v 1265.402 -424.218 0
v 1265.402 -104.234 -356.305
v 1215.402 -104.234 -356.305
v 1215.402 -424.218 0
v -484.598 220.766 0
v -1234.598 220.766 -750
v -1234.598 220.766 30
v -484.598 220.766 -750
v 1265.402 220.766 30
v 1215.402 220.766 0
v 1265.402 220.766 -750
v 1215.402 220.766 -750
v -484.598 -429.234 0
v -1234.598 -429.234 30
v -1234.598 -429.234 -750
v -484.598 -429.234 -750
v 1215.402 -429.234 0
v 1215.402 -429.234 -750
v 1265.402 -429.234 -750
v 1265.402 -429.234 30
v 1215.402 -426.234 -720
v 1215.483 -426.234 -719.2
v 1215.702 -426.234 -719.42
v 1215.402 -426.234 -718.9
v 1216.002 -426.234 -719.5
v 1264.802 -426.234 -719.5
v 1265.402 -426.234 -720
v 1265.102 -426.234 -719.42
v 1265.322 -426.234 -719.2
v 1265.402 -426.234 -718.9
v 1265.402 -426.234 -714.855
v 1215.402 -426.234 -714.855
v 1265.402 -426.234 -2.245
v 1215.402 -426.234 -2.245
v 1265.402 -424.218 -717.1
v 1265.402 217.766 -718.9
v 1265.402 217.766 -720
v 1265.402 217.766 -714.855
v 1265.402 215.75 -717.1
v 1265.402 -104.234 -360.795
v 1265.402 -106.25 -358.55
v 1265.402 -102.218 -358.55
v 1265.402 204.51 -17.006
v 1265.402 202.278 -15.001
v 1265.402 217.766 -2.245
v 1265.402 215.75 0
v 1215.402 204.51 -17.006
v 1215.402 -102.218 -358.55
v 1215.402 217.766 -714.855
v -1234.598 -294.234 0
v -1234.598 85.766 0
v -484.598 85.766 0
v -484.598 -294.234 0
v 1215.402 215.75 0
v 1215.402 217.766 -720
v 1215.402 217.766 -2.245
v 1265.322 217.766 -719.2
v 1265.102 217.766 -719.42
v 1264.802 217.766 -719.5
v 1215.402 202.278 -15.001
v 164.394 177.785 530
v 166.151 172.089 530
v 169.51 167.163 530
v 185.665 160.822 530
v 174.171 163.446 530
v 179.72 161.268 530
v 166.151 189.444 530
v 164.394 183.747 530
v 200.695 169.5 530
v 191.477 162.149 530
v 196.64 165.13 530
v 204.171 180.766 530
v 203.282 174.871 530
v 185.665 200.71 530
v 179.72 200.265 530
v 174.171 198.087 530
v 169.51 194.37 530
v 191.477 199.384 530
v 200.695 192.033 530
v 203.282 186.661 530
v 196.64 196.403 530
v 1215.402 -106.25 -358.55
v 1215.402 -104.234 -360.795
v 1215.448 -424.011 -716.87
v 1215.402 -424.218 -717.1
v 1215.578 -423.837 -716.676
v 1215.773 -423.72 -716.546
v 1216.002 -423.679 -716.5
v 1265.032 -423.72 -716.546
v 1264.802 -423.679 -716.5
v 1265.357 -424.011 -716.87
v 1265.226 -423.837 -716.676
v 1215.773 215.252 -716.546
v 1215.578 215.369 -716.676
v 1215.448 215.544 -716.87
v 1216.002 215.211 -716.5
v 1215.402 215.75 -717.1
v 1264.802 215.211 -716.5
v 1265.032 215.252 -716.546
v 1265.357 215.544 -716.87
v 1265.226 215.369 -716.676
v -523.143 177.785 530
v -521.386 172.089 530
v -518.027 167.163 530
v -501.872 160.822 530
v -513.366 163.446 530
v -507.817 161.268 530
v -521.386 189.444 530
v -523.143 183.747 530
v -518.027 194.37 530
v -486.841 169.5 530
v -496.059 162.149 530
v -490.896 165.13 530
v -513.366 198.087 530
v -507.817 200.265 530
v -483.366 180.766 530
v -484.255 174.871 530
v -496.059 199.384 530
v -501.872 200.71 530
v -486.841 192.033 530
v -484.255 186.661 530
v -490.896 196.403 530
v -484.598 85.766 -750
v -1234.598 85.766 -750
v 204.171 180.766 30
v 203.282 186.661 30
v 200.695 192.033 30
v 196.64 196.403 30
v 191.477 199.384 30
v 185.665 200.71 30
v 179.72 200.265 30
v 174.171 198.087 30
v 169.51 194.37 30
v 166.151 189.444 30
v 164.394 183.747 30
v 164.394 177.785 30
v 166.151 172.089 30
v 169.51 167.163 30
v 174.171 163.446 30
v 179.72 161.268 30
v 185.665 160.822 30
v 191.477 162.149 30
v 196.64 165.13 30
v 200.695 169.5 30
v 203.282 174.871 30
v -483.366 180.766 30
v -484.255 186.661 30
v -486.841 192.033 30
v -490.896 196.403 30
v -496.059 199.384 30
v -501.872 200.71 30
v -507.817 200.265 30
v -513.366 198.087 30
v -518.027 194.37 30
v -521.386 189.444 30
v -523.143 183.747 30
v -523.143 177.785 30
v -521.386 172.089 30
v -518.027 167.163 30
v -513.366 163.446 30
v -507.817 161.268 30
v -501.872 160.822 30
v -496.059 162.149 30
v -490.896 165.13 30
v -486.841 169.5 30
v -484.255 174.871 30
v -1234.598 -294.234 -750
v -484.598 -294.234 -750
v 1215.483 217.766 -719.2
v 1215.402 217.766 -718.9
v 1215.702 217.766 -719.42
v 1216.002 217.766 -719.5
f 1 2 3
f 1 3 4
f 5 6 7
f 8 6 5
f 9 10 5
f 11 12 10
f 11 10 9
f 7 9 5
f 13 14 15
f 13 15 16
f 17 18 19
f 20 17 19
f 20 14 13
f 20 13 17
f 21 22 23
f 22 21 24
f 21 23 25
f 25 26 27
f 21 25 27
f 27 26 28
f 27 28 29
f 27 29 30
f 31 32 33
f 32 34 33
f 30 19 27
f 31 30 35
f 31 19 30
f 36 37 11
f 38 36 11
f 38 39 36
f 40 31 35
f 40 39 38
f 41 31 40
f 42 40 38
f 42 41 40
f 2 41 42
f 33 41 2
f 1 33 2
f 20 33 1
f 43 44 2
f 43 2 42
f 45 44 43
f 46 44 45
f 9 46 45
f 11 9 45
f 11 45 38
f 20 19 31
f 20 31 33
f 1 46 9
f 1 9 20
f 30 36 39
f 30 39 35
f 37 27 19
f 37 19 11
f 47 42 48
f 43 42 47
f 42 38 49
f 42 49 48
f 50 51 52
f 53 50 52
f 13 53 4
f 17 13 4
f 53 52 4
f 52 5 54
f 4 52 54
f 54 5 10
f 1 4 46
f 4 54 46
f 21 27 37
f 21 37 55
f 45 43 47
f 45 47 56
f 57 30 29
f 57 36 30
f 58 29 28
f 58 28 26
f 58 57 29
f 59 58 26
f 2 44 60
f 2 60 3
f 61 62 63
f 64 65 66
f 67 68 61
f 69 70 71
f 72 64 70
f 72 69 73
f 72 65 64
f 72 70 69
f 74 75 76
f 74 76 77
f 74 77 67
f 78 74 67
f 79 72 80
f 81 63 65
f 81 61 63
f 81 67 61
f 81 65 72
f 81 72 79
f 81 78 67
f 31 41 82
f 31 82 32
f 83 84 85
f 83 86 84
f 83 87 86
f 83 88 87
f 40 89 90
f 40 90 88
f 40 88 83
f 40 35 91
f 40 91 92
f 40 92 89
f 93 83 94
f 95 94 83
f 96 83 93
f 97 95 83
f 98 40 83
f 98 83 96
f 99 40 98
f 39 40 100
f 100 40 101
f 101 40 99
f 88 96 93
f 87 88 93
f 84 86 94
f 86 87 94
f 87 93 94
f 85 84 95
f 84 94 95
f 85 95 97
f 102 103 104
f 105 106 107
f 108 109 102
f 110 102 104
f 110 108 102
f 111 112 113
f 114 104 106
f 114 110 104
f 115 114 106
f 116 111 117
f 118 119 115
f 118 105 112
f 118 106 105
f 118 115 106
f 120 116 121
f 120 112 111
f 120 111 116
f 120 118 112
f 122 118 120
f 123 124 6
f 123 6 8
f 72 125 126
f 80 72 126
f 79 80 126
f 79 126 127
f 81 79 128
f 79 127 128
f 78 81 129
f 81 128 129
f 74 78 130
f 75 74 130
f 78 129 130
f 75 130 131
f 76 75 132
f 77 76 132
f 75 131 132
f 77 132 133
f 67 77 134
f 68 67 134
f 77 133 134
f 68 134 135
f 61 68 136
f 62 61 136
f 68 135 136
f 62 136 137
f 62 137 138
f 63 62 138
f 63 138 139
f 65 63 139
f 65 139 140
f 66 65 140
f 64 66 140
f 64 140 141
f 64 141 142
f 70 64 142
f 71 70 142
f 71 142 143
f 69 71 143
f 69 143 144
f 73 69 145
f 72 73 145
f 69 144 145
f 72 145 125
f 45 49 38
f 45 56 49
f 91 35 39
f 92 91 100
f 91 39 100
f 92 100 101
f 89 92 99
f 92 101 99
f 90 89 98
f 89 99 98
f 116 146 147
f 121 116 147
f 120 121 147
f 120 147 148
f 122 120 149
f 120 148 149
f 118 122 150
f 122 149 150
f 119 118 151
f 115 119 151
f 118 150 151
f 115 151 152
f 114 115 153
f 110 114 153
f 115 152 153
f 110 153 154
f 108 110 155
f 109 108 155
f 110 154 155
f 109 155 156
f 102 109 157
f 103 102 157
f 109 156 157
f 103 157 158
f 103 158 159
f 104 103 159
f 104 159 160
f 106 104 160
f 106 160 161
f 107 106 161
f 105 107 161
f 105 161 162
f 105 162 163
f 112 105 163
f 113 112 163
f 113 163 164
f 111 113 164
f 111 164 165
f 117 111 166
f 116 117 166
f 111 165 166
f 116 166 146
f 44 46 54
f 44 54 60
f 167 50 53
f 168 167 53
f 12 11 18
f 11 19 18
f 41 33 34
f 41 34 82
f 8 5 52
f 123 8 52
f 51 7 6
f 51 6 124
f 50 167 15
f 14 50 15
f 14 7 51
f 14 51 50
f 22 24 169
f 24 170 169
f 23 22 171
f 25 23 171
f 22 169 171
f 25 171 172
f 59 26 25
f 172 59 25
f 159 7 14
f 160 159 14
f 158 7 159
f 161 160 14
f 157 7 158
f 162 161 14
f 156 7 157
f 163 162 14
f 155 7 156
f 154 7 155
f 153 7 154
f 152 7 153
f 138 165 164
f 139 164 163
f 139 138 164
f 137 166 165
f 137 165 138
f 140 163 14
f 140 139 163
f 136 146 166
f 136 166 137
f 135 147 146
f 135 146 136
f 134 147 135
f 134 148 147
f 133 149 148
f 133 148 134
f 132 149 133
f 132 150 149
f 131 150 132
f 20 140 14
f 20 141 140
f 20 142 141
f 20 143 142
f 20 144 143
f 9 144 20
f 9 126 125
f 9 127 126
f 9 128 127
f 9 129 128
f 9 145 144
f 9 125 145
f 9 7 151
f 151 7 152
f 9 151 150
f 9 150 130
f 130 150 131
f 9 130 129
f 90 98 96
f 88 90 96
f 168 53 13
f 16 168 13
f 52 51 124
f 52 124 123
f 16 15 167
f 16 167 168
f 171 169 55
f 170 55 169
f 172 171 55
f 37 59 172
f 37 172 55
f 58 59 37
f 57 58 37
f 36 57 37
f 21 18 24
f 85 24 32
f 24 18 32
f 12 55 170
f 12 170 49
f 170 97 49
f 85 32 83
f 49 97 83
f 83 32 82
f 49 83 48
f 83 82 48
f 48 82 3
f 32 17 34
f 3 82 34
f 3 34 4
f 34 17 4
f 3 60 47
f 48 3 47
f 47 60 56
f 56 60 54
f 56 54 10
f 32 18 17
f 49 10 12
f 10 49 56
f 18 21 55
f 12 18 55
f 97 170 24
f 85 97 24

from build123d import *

# Parameters (mm, degrees)
F0_W      = 2500
F0_H      = 650
F1_DEPTH  = 30
F2_W      = 750
F2_H      = 135
F3_DEPTH  = 750
F4_W      = 50
F4_H      = 3
F5_DEPTH  = 750
F6_W      = 50
F6_H      = 30
F6_H_2    = 3
F7_DEPTH  = 644
F8_R      = 0.6
F10_R     = 20
F11_DEPTH = 500
F12_DEPTH = 50


with BuildPart() as f1:
    # F0 (on Top) → F1 (new body)
    with BuildSketch(Plane.XY):
        with Locations((15.4022108763, -104.233725491)):
            Rectangle(F0_W, F0_H)
    extrude(amount=F1_DEPTH)

    # F2 (on face) → F3 (join)
    with BuildSketch(Plane(origin=(0, 0, 0), x_dir=(1, 0, 0), z_dir=(0, 0, -1))):
        with Locations((-859.5977891237, 361.733725491)):
            Rectangle(F2_W, F2_H)
        with Locations((-859.5977891237, -153.266274509)):
            Rectangle(F2_W, F2_H)
    extrude(amount=F3_DEPTH)

    # F4 (on face) → F5 (join)
    with BuildSketch(Plane(origin=(0, 0, 0), x_dir=(1, 0, 0), z_dir=(0, 0, -1))):
        with Locations((1240.4022108763, 427.733725491)):
            Rectangle(F4_W, F4_H)
        with Locations((1240.4022108763, -219.266274509)):
            Rectangle(F4_W, F4_H)
    extrude(amount=F5_DEPTH)

    # F6 (on face) → F7 (join, through all)
    with BuildSketch(Plane(origin=(0, -426.233725491, 0), x_dir=(-1, 0, 0), z_dir=(0, 1, 0))):
        with Locations((-1240.4022108763, -735)):
            Rectangle(F6_W, F6_H)
        with Locations((-1240.4022108763, -718)):
            Rectangle(F6_W, F6_H_2)
    extrude(amount=F7_DEPTH)

    # F8
    f8_edges = [f1.edges().sort_by_distance(p)[0] for p in [
        (1215.402211, -104.233725, -716.5),
        (1215.402211, -104.233725, -719.5),
        (1265.402211, -104.233725, -719.5),
        (1265.402211, -104.233725, -716.5),
    ]]
    fillet(f8_edges, radius=F8_R)

    # F10 (on face) → F11 (join)
    with BuildSketch(Plane.XY.offset(30)):
        with Locations((-503.3661296115, 180.766274509)):
            Circle(F10_R)
        with Locations((184.1705513642, 180.766274509)):
            Circle(F10_R)
    extrude(amount=F11_DEPTH)

    # F9 (on face) → F12 (join)
    with BuildSketch(Plane.YZ.offset(1265.4022108763)):
        Polygon((-426.233725491, -2.2449458227), (-420.1270755585, -9.0447574168), (-106.2498252118, -358.55), (-426.233725491, -714.8550541773), (-426.233725491, -716.5), (-426.233725491, -717.1), (-424.2176257702, -717.1), (-104.233725491, -360.7949458227), (215.7501747882, -717.1), (217.766274509, -717.1), (217.766274509, -716.5), (217.766274509, -714.8550541773), (-102.2176257702, -358.55), (204.5102027522, -17.0057052277), (217.766274509, -2.2449458227), (217.766274509, 0), (215.7501747882, 0), (202.2781703018, -15.0012025111), (-104.233725491, -356.3050541773), (-417.8950431081, -7.0402547003), (-424.2176257702, 0), (-426.233725491, 0), align=None)
    extrude(amount=-F12_DEPTH)


solid = f1.part
